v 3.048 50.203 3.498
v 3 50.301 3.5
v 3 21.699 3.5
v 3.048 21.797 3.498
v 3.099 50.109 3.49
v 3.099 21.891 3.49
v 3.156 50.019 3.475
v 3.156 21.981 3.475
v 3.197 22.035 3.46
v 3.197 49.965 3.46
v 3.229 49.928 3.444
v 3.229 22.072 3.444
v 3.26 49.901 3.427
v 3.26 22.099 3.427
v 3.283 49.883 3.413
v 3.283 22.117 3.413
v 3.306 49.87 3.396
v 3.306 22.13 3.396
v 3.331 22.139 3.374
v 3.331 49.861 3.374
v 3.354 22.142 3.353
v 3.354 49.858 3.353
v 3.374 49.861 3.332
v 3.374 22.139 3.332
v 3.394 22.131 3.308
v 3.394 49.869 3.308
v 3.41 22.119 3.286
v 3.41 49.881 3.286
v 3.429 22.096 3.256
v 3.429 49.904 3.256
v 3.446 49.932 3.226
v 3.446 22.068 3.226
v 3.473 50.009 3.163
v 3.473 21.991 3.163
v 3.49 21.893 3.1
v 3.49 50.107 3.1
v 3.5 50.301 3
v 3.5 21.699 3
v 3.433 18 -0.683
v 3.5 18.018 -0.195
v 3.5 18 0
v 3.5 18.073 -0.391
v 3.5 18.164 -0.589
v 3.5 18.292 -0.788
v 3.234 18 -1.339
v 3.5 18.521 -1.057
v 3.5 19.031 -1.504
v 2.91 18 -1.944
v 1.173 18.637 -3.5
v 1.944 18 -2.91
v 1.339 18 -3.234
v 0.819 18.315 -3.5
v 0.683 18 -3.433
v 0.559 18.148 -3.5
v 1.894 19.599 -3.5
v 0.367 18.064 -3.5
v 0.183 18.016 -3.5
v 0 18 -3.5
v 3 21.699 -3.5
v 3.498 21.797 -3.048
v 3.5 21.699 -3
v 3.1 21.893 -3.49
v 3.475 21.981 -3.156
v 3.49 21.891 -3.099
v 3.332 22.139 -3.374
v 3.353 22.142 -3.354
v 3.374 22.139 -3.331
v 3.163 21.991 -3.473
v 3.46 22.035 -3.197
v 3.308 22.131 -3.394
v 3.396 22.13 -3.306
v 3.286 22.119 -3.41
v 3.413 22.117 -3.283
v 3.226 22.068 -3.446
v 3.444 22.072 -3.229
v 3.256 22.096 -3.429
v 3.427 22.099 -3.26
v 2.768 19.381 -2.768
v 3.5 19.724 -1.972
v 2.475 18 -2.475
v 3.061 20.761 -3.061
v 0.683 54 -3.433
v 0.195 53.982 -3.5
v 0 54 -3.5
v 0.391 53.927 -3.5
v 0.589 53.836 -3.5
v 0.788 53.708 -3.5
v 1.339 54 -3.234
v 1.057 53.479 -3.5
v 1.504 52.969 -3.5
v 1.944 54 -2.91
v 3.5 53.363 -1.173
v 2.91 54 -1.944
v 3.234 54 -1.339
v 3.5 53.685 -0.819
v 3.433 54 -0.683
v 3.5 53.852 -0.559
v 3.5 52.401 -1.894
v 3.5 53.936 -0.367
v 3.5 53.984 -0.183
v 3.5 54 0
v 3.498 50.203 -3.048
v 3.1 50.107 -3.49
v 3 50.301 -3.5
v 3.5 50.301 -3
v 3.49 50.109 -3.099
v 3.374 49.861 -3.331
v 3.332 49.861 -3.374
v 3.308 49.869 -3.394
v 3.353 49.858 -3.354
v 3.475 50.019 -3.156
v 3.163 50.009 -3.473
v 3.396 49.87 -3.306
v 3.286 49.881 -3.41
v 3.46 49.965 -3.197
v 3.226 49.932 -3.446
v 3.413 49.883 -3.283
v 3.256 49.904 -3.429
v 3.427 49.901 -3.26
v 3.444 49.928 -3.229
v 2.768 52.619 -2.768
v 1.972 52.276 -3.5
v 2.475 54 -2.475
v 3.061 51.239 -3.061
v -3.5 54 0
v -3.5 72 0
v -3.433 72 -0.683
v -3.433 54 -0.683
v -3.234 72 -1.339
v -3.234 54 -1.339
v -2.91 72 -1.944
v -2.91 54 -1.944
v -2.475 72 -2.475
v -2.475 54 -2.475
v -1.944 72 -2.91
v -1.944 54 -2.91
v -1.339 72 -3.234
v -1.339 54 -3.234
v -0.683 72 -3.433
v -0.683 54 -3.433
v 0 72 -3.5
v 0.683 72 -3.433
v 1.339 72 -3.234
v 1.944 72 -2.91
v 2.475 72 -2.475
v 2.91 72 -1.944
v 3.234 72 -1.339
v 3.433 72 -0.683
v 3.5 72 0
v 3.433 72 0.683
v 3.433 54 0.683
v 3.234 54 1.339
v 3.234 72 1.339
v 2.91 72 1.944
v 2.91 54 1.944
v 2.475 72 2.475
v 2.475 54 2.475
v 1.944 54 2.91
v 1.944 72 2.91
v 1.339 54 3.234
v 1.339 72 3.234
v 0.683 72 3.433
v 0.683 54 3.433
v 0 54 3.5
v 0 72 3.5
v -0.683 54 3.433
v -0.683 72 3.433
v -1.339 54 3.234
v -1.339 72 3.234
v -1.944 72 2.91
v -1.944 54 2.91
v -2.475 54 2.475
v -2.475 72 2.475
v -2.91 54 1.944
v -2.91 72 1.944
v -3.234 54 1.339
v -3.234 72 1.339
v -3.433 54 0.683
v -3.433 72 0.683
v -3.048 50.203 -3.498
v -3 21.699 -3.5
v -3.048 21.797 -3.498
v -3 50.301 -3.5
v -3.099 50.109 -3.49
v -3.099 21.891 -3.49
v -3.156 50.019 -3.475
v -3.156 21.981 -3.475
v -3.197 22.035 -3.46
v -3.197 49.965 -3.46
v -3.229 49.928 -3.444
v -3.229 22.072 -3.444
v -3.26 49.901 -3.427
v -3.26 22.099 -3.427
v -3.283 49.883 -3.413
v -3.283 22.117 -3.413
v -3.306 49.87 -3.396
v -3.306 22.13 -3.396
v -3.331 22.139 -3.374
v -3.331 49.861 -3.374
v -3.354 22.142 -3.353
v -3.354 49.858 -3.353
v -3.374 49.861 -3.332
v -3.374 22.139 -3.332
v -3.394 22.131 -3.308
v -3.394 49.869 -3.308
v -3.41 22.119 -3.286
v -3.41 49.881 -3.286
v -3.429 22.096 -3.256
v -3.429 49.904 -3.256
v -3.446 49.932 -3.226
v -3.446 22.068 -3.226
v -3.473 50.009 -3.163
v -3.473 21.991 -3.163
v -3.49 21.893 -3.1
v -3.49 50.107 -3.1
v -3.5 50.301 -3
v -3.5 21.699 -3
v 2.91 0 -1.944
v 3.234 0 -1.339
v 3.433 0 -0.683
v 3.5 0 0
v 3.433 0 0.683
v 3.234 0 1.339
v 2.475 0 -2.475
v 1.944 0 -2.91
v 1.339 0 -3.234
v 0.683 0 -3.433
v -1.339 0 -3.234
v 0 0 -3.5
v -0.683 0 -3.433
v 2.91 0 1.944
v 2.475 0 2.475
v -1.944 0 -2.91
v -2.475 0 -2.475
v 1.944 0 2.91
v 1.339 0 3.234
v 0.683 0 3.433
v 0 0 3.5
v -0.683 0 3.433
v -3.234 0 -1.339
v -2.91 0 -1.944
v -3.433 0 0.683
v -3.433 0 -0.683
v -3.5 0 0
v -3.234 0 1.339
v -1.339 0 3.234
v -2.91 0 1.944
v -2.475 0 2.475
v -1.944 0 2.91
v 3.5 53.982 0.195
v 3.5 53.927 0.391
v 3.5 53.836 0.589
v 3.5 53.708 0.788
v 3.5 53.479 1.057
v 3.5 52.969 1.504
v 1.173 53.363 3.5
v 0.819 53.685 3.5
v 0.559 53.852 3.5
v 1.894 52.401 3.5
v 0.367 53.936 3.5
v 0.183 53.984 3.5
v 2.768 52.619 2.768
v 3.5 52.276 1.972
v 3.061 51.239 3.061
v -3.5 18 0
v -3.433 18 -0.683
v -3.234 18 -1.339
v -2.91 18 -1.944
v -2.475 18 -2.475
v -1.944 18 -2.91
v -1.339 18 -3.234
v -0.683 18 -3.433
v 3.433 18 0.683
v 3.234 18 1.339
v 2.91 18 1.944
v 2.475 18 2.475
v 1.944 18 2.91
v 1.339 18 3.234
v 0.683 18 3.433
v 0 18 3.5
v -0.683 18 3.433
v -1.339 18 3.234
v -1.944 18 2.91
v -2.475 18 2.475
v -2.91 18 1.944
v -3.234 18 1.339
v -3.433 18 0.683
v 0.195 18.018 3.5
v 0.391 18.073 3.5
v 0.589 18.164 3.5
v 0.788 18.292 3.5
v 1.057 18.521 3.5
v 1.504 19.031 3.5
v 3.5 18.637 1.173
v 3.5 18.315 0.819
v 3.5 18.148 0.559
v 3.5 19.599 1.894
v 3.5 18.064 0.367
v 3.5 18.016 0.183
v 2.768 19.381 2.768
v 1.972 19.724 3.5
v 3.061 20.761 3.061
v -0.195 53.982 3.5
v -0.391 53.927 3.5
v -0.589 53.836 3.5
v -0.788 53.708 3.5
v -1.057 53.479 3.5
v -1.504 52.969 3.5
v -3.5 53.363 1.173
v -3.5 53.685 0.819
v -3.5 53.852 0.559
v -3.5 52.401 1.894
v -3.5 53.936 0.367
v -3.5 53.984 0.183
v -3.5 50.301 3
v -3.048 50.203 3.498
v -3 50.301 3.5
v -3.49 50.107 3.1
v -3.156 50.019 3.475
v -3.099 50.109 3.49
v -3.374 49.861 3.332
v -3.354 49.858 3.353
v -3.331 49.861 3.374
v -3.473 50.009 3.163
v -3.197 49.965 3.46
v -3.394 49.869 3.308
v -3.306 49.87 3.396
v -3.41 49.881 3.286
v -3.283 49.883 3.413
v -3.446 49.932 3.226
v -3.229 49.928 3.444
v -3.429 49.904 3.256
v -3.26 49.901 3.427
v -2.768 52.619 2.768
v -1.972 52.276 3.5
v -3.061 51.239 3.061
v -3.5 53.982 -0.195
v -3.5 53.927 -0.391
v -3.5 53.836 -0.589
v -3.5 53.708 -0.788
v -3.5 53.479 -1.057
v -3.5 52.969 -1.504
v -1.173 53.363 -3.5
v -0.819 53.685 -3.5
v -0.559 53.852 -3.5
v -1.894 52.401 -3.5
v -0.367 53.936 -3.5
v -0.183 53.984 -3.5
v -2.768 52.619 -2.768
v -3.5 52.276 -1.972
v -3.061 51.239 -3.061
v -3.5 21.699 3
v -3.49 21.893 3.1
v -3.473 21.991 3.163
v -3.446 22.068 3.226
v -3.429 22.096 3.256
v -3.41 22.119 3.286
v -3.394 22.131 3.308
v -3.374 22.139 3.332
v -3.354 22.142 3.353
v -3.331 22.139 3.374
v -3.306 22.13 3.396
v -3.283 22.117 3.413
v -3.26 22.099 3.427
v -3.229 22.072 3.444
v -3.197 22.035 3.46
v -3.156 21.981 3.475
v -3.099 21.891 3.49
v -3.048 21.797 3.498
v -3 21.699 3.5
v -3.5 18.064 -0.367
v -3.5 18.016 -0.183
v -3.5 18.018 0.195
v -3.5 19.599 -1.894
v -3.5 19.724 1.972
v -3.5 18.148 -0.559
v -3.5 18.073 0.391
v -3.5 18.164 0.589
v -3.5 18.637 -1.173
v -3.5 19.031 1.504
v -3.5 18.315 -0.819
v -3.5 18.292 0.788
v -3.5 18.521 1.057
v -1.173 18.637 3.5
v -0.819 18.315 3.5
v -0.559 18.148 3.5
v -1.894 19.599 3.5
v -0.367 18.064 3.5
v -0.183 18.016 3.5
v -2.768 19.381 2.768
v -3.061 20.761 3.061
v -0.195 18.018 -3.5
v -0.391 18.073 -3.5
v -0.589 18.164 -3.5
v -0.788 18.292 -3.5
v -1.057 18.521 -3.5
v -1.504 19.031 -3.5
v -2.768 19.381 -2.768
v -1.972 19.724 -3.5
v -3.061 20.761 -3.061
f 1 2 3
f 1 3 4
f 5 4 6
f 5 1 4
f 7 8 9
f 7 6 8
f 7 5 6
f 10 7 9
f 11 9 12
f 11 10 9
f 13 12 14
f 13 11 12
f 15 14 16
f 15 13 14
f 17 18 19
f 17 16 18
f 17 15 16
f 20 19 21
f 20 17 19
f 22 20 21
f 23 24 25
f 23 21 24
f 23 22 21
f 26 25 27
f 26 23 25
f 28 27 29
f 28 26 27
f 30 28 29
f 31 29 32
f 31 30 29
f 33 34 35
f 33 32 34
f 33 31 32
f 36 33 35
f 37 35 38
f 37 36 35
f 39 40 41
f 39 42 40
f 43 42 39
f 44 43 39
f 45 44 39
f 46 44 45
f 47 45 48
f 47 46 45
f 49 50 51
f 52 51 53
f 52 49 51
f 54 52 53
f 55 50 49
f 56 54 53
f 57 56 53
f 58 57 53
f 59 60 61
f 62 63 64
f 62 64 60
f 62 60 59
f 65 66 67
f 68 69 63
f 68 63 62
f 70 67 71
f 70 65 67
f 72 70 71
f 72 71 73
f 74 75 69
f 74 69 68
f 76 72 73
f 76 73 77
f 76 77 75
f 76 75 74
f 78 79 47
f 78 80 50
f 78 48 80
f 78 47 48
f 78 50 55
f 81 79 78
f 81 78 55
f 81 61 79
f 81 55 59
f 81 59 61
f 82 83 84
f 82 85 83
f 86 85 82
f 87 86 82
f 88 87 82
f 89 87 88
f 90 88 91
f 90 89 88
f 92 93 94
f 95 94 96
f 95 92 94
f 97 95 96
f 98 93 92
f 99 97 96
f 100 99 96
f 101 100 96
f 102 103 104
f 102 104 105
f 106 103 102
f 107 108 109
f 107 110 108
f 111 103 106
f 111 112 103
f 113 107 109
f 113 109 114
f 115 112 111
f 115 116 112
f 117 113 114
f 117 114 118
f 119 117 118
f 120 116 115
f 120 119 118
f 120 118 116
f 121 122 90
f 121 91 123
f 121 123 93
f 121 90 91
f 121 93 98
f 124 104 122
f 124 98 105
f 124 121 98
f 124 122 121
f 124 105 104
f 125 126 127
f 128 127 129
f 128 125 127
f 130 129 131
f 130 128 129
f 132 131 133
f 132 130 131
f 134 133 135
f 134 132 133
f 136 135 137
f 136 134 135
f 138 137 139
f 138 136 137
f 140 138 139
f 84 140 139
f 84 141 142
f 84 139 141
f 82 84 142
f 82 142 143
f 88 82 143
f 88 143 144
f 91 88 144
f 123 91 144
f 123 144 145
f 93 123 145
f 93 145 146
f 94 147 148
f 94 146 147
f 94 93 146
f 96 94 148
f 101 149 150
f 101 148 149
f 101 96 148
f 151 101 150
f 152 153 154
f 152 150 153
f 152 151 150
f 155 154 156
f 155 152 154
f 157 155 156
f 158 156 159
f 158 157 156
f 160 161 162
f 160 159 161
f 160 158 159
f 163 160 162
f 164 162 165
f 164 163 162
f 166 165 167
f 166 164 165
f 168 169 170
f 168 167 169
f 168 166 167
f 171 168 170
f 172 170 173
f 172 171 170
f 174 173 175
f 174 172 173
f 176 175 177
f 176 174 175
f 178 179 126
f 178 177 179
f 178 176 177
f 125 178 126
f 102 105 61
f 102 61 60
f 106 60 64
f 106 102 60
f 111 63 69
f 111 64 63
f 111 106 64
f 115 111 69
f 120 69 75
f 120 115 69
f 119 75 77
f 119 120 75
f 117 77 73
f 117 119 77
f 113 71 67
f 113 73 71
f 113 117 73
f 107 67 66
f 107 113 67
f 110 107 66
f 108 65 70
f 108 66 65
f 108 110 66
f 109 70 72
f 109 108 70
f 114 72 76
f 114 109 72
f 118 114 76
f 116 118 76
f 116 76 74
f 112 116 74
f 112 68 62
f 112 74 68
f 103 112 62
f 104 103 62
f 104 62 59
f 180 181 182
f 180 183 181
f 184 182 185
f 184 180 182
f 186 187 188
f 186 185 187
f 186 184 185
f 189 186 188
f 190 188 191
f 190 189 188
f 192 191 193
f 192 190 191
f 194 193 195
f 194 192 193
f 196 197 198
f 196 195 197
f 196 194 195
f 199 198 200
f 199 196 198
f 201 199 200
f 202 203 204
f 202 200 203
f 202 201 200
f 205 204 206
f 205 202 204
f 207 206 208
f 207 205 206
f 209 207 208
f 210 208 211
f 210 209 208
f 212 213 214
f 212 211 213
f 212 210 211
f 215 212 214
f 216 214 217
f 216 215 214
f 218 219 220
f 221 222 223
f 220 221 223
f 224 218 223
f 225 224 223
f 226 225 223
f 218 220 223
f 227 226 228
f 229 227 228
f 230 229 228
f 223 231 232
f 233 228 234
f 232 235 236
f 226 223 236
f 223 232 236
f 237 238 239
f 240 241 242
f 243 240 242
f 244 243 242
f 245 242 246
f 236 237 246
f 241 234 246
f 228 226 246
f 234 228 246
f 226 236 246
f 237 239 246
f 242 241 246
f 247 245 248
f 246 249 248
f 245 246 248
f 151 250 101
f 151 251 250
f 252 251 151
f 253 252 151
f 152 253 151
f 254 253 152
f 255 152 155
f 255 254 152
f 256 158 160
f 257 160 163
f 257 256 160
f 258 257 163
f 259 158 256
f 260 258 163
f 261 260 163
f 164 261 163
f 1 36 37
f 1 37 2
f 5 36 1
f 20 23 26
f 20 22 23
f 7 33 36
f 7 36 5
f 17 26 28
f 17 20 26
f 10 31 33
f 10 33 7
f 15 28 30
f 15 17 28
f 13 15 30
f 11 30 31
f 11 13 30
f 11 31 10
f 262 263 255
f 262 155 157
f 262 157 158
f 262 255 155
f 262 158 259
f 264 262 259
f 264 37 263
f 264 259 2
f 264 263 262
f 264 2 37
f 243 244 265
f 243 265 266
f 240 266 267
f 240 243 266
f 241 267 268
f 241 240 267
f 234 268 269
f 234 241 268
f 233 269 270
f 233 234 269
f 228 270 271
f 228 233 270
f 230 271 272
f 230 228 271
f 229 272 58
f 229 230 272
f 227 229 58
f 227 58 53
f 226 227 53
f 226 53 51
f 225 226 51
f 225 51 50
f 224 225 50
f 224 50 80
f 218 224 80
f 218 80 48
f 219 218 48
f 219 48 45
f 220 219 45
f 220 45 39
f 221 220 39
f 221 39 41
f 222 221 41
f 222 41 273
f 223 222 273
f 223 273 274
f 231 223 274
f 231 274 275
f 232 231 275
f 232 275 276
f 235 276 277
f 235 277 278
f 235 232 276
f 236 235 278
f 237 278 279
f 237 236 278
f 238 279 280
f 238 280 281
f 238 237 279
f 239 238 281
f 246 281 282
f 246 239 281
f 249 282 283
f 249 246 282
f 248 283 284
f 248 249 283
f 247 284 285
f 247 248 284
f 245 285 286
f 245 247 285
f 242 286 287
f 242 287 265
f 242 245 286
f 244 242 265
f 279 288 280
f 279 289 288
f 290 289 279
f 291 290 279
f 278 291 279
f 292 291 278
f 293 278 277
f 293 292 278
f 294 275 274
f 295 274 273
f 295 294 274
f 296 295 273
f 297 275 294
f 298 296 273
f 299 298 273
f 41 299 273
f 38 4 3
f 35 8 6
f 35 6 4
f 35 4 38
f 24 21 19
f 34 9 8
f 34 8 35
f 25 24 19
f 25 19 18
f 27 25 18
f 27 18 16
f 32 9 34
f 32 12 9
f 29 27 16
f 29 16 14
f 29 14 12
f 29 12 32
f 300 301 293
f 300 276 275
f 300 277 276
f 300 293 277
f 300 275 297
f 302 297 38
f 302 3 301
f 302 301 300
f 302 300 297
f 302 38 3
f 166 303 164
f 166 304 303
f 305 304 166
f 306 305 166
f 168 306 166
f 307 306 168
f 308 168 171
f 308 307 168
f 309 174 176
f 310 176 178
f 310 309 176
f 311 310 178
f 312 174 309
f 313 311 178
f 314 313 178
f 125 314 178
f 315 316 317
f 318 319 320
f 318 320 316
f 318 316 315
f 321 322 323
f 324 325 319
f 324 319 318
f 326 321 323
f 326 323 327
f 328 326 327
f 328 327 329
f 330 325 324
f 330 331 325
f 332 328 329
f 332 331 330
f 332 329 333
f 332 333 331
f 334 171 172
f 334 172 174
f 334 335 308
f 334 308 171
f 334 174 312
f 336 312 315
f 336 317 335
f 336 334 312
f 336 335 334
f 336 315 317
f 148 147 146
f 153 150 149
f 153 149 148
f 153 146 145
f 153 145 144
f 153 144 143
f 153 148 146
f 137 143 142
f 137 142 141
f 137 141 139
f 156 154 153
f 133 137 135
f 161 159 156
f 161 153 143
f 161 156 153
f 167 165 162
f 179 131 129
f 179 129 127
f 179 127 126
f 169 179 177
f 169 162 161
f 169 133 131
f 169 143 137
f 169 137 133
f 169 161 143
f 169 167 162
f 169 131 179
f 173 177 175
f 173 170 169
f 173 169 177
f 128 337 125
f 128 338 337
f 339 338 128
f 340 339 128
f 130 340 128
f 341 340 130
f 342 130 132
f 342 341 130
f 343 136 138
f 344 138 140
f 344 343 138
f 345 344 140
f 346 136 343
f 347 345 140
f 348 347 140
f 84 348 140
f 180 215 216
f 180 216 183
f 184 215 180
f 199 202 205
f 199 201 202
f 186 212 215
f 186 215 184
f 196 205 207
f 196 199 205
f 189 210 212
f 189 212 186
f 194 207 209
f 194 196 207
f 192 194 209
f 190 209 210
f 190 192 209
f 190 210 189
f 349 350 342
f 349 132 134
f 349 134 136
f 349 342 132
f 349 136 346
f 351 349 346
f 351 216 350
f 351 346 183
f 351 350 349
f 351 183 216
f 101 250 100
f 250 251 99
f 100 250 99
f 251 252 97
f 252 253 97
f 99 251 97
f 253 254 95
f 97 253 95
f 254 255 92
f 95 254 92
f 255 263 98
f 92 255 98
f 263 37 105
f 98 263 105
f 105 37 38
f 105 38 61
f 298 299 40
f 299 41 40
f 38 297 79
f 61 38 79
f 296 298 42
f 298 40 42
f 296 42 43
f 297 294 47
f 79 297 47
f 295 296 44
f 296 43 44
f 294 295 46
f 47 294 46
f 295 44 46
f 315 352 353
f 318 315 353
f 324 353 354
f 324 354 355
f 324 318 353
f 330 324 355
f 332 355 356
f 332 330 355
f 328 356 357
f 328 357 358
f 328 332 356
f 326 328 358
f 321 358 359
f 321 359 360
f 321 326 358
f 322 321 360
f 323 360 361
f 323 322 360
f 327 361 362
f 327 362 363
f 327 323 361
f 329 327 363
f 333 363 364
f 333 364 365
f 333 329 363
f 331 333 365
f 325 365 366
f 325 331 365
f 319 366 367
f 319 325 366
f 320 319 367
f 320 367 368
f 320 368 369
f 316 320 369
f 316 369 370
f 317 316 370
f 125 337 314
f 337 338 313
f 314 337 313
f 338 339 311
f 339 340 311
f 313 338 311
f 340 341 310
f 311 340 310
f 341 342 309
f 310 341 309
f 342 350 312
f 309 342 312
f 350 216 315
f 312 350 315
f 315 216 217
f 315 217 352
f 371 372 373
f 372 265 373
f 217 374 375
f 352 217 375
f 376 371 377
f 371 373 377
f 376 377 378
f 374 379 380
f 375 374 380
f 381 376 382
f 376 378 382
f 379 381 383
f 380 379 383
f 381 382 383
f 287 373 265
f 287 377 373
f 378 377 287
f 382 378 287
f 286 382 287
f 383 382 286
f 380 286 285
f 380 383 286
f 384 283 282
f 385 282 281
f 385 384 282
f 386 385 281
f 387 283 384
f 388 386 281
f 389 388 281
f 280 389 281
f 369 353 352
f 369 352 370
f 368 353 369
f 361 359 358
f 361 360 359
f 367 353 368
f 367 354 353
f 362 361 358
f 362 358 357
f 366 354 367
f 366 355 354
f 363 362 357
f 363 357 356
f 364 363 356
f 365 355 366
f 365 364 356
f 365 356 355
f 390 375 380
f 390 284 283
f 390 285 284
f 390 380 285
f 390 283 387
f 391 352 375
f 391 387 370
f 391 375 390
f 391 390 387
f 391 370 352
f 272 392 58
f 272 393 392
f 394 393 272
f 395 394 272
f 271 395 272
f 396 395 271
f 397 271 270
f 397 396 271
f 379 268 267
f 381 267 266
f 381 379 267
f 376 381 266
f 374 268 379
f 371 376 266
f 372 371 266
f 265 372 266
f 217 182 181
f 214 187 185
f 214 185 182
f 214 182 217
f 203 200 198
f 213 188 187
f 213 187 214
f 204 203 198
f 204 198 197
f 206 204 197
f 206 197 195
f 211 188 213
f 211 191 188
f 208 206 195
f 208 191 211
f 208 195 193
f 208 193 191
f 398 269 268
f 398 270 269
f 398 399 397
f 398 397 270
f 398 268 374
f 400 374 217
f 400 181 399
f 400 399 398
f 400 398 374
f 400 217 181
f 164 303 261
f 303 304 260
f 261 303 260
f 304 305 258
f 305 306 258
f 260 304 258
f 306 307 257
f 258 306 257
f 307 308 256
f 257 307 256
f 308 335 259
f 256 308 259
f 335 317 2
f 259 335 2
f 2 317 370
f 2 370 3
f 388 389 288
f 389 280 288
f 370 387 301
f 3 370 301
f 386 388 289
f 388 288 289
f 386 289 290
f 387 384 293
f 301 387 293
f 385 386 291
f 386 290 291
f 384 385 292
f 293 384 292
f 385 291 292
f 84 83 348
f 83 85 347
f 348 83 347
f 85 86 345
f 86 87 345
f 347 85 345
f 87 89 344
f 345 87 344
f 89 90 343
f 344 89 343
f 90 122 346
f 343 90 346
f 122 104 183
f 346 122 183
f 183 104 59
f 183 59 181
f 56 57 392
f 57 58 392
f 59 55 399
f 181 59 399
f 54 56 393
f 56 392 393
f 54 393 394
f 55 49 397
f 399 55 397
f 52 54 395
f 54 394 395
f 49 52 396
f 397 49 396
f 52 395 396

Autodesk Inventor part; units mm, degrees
ref_plane "YZ Plane" through (0, 0, 0) normal (1, 0, 0) x (0, 1, 0)
ref_plane "XY Plane" through (0, 0, 0) normal (0, 0, 1) x (1, 0, 0)
sketch "Boceto1" plane through (0, 0, 0) normal (0, 1, 0) x (-1, 0, 0)
  circle A0 centre (0, 0) radius 3.5
  dimension "d0" = 7
extrude "Extrusión1" add sketch "Boceto1" along normal blind 72
ref_plane "Plano de trabajo1" through (0, 18, 0) normal (0, 1, 0) x (-1, 0, 0)
sketch "Boceto3" plane through (0, 18, 0) normal (0, 1, 0) x (-1, 0, 0)
  line L0 (-3.5, 0) -> (-3.5, -3.5)
  line L1 (-3.5, -3.5) -> (0, -3.5)
  line L2 (-3.5, -3.5) -> (3.5, -3.5)
  line L3 (3.5, -3.5) -> (3.5, 3.5)
  line L4 (3.5, 3.5) -> (-3.5, 3.5)
  line L5 (-3.5, 3.5) -> (-3.5, -3.5)
  point P0 (0, 0)
  dimension "d26" = 3.5
  dimension "d27" = 3.5
  dimension "d28" = 7
  dimension "d29" = 7
extrude "Extrusión3" add sketch "Boceto3" along normal blind 36
sketch "Boceto4" plane through (0, 0, 0) normal (1, 0, 0) x (0, 1, 0)
  line L0 (0, 0) -> (18, 0)
  line L1 (18, 0) -> (18, 3.5)
  line L2 (23, 5) -> (18, 3.5)
  line L3 (18, 0) -> (54, 0)
  line L4 (54, 0) -> (54, 3.5)
  line L5 (49, 5) -> (54, 3.5)
  line L6 (23, 5) -> (24.5315, 10.105)
  line L7 (24.5315, 10.105) -> (47.4685, 10.105)
  line L8 (18, 3.5) -> (7.2687, 12.5016)
  line L9 (7.2687, 12.5016) -> (61.5507, 12.5016)
  line L10 (61.5507, 12.5016) -> (54, 3.5)
  line L11 (49, 5) -> (47.4685, 10.105)
  dimension "d31" = 18
  dimension "d32" = 3.5
  dimension "d36" = 3.5
revolve "Revolución2" cut sketch "Boceto4" angle 360 about axis through (0, 0, 0) along (0, 1, 0) contours L8 L9 L10 L5 L11 L7 L6 L2
fillet "Empalme1" radius 0.5 4 edges at (3.5, 36, 3.5) (-3.5, 36, 3.5) (3.5, 36, -3.5) (-3.5, 36, -3.5)
thread "Rosca1" size "M7x1" class "6g" standard "ANSI Metric M Profile" full length
thread "Rosca2" size "M7x1" class "6g" standard "ANSI Metric M Profile" full length
properties material "Acero"
